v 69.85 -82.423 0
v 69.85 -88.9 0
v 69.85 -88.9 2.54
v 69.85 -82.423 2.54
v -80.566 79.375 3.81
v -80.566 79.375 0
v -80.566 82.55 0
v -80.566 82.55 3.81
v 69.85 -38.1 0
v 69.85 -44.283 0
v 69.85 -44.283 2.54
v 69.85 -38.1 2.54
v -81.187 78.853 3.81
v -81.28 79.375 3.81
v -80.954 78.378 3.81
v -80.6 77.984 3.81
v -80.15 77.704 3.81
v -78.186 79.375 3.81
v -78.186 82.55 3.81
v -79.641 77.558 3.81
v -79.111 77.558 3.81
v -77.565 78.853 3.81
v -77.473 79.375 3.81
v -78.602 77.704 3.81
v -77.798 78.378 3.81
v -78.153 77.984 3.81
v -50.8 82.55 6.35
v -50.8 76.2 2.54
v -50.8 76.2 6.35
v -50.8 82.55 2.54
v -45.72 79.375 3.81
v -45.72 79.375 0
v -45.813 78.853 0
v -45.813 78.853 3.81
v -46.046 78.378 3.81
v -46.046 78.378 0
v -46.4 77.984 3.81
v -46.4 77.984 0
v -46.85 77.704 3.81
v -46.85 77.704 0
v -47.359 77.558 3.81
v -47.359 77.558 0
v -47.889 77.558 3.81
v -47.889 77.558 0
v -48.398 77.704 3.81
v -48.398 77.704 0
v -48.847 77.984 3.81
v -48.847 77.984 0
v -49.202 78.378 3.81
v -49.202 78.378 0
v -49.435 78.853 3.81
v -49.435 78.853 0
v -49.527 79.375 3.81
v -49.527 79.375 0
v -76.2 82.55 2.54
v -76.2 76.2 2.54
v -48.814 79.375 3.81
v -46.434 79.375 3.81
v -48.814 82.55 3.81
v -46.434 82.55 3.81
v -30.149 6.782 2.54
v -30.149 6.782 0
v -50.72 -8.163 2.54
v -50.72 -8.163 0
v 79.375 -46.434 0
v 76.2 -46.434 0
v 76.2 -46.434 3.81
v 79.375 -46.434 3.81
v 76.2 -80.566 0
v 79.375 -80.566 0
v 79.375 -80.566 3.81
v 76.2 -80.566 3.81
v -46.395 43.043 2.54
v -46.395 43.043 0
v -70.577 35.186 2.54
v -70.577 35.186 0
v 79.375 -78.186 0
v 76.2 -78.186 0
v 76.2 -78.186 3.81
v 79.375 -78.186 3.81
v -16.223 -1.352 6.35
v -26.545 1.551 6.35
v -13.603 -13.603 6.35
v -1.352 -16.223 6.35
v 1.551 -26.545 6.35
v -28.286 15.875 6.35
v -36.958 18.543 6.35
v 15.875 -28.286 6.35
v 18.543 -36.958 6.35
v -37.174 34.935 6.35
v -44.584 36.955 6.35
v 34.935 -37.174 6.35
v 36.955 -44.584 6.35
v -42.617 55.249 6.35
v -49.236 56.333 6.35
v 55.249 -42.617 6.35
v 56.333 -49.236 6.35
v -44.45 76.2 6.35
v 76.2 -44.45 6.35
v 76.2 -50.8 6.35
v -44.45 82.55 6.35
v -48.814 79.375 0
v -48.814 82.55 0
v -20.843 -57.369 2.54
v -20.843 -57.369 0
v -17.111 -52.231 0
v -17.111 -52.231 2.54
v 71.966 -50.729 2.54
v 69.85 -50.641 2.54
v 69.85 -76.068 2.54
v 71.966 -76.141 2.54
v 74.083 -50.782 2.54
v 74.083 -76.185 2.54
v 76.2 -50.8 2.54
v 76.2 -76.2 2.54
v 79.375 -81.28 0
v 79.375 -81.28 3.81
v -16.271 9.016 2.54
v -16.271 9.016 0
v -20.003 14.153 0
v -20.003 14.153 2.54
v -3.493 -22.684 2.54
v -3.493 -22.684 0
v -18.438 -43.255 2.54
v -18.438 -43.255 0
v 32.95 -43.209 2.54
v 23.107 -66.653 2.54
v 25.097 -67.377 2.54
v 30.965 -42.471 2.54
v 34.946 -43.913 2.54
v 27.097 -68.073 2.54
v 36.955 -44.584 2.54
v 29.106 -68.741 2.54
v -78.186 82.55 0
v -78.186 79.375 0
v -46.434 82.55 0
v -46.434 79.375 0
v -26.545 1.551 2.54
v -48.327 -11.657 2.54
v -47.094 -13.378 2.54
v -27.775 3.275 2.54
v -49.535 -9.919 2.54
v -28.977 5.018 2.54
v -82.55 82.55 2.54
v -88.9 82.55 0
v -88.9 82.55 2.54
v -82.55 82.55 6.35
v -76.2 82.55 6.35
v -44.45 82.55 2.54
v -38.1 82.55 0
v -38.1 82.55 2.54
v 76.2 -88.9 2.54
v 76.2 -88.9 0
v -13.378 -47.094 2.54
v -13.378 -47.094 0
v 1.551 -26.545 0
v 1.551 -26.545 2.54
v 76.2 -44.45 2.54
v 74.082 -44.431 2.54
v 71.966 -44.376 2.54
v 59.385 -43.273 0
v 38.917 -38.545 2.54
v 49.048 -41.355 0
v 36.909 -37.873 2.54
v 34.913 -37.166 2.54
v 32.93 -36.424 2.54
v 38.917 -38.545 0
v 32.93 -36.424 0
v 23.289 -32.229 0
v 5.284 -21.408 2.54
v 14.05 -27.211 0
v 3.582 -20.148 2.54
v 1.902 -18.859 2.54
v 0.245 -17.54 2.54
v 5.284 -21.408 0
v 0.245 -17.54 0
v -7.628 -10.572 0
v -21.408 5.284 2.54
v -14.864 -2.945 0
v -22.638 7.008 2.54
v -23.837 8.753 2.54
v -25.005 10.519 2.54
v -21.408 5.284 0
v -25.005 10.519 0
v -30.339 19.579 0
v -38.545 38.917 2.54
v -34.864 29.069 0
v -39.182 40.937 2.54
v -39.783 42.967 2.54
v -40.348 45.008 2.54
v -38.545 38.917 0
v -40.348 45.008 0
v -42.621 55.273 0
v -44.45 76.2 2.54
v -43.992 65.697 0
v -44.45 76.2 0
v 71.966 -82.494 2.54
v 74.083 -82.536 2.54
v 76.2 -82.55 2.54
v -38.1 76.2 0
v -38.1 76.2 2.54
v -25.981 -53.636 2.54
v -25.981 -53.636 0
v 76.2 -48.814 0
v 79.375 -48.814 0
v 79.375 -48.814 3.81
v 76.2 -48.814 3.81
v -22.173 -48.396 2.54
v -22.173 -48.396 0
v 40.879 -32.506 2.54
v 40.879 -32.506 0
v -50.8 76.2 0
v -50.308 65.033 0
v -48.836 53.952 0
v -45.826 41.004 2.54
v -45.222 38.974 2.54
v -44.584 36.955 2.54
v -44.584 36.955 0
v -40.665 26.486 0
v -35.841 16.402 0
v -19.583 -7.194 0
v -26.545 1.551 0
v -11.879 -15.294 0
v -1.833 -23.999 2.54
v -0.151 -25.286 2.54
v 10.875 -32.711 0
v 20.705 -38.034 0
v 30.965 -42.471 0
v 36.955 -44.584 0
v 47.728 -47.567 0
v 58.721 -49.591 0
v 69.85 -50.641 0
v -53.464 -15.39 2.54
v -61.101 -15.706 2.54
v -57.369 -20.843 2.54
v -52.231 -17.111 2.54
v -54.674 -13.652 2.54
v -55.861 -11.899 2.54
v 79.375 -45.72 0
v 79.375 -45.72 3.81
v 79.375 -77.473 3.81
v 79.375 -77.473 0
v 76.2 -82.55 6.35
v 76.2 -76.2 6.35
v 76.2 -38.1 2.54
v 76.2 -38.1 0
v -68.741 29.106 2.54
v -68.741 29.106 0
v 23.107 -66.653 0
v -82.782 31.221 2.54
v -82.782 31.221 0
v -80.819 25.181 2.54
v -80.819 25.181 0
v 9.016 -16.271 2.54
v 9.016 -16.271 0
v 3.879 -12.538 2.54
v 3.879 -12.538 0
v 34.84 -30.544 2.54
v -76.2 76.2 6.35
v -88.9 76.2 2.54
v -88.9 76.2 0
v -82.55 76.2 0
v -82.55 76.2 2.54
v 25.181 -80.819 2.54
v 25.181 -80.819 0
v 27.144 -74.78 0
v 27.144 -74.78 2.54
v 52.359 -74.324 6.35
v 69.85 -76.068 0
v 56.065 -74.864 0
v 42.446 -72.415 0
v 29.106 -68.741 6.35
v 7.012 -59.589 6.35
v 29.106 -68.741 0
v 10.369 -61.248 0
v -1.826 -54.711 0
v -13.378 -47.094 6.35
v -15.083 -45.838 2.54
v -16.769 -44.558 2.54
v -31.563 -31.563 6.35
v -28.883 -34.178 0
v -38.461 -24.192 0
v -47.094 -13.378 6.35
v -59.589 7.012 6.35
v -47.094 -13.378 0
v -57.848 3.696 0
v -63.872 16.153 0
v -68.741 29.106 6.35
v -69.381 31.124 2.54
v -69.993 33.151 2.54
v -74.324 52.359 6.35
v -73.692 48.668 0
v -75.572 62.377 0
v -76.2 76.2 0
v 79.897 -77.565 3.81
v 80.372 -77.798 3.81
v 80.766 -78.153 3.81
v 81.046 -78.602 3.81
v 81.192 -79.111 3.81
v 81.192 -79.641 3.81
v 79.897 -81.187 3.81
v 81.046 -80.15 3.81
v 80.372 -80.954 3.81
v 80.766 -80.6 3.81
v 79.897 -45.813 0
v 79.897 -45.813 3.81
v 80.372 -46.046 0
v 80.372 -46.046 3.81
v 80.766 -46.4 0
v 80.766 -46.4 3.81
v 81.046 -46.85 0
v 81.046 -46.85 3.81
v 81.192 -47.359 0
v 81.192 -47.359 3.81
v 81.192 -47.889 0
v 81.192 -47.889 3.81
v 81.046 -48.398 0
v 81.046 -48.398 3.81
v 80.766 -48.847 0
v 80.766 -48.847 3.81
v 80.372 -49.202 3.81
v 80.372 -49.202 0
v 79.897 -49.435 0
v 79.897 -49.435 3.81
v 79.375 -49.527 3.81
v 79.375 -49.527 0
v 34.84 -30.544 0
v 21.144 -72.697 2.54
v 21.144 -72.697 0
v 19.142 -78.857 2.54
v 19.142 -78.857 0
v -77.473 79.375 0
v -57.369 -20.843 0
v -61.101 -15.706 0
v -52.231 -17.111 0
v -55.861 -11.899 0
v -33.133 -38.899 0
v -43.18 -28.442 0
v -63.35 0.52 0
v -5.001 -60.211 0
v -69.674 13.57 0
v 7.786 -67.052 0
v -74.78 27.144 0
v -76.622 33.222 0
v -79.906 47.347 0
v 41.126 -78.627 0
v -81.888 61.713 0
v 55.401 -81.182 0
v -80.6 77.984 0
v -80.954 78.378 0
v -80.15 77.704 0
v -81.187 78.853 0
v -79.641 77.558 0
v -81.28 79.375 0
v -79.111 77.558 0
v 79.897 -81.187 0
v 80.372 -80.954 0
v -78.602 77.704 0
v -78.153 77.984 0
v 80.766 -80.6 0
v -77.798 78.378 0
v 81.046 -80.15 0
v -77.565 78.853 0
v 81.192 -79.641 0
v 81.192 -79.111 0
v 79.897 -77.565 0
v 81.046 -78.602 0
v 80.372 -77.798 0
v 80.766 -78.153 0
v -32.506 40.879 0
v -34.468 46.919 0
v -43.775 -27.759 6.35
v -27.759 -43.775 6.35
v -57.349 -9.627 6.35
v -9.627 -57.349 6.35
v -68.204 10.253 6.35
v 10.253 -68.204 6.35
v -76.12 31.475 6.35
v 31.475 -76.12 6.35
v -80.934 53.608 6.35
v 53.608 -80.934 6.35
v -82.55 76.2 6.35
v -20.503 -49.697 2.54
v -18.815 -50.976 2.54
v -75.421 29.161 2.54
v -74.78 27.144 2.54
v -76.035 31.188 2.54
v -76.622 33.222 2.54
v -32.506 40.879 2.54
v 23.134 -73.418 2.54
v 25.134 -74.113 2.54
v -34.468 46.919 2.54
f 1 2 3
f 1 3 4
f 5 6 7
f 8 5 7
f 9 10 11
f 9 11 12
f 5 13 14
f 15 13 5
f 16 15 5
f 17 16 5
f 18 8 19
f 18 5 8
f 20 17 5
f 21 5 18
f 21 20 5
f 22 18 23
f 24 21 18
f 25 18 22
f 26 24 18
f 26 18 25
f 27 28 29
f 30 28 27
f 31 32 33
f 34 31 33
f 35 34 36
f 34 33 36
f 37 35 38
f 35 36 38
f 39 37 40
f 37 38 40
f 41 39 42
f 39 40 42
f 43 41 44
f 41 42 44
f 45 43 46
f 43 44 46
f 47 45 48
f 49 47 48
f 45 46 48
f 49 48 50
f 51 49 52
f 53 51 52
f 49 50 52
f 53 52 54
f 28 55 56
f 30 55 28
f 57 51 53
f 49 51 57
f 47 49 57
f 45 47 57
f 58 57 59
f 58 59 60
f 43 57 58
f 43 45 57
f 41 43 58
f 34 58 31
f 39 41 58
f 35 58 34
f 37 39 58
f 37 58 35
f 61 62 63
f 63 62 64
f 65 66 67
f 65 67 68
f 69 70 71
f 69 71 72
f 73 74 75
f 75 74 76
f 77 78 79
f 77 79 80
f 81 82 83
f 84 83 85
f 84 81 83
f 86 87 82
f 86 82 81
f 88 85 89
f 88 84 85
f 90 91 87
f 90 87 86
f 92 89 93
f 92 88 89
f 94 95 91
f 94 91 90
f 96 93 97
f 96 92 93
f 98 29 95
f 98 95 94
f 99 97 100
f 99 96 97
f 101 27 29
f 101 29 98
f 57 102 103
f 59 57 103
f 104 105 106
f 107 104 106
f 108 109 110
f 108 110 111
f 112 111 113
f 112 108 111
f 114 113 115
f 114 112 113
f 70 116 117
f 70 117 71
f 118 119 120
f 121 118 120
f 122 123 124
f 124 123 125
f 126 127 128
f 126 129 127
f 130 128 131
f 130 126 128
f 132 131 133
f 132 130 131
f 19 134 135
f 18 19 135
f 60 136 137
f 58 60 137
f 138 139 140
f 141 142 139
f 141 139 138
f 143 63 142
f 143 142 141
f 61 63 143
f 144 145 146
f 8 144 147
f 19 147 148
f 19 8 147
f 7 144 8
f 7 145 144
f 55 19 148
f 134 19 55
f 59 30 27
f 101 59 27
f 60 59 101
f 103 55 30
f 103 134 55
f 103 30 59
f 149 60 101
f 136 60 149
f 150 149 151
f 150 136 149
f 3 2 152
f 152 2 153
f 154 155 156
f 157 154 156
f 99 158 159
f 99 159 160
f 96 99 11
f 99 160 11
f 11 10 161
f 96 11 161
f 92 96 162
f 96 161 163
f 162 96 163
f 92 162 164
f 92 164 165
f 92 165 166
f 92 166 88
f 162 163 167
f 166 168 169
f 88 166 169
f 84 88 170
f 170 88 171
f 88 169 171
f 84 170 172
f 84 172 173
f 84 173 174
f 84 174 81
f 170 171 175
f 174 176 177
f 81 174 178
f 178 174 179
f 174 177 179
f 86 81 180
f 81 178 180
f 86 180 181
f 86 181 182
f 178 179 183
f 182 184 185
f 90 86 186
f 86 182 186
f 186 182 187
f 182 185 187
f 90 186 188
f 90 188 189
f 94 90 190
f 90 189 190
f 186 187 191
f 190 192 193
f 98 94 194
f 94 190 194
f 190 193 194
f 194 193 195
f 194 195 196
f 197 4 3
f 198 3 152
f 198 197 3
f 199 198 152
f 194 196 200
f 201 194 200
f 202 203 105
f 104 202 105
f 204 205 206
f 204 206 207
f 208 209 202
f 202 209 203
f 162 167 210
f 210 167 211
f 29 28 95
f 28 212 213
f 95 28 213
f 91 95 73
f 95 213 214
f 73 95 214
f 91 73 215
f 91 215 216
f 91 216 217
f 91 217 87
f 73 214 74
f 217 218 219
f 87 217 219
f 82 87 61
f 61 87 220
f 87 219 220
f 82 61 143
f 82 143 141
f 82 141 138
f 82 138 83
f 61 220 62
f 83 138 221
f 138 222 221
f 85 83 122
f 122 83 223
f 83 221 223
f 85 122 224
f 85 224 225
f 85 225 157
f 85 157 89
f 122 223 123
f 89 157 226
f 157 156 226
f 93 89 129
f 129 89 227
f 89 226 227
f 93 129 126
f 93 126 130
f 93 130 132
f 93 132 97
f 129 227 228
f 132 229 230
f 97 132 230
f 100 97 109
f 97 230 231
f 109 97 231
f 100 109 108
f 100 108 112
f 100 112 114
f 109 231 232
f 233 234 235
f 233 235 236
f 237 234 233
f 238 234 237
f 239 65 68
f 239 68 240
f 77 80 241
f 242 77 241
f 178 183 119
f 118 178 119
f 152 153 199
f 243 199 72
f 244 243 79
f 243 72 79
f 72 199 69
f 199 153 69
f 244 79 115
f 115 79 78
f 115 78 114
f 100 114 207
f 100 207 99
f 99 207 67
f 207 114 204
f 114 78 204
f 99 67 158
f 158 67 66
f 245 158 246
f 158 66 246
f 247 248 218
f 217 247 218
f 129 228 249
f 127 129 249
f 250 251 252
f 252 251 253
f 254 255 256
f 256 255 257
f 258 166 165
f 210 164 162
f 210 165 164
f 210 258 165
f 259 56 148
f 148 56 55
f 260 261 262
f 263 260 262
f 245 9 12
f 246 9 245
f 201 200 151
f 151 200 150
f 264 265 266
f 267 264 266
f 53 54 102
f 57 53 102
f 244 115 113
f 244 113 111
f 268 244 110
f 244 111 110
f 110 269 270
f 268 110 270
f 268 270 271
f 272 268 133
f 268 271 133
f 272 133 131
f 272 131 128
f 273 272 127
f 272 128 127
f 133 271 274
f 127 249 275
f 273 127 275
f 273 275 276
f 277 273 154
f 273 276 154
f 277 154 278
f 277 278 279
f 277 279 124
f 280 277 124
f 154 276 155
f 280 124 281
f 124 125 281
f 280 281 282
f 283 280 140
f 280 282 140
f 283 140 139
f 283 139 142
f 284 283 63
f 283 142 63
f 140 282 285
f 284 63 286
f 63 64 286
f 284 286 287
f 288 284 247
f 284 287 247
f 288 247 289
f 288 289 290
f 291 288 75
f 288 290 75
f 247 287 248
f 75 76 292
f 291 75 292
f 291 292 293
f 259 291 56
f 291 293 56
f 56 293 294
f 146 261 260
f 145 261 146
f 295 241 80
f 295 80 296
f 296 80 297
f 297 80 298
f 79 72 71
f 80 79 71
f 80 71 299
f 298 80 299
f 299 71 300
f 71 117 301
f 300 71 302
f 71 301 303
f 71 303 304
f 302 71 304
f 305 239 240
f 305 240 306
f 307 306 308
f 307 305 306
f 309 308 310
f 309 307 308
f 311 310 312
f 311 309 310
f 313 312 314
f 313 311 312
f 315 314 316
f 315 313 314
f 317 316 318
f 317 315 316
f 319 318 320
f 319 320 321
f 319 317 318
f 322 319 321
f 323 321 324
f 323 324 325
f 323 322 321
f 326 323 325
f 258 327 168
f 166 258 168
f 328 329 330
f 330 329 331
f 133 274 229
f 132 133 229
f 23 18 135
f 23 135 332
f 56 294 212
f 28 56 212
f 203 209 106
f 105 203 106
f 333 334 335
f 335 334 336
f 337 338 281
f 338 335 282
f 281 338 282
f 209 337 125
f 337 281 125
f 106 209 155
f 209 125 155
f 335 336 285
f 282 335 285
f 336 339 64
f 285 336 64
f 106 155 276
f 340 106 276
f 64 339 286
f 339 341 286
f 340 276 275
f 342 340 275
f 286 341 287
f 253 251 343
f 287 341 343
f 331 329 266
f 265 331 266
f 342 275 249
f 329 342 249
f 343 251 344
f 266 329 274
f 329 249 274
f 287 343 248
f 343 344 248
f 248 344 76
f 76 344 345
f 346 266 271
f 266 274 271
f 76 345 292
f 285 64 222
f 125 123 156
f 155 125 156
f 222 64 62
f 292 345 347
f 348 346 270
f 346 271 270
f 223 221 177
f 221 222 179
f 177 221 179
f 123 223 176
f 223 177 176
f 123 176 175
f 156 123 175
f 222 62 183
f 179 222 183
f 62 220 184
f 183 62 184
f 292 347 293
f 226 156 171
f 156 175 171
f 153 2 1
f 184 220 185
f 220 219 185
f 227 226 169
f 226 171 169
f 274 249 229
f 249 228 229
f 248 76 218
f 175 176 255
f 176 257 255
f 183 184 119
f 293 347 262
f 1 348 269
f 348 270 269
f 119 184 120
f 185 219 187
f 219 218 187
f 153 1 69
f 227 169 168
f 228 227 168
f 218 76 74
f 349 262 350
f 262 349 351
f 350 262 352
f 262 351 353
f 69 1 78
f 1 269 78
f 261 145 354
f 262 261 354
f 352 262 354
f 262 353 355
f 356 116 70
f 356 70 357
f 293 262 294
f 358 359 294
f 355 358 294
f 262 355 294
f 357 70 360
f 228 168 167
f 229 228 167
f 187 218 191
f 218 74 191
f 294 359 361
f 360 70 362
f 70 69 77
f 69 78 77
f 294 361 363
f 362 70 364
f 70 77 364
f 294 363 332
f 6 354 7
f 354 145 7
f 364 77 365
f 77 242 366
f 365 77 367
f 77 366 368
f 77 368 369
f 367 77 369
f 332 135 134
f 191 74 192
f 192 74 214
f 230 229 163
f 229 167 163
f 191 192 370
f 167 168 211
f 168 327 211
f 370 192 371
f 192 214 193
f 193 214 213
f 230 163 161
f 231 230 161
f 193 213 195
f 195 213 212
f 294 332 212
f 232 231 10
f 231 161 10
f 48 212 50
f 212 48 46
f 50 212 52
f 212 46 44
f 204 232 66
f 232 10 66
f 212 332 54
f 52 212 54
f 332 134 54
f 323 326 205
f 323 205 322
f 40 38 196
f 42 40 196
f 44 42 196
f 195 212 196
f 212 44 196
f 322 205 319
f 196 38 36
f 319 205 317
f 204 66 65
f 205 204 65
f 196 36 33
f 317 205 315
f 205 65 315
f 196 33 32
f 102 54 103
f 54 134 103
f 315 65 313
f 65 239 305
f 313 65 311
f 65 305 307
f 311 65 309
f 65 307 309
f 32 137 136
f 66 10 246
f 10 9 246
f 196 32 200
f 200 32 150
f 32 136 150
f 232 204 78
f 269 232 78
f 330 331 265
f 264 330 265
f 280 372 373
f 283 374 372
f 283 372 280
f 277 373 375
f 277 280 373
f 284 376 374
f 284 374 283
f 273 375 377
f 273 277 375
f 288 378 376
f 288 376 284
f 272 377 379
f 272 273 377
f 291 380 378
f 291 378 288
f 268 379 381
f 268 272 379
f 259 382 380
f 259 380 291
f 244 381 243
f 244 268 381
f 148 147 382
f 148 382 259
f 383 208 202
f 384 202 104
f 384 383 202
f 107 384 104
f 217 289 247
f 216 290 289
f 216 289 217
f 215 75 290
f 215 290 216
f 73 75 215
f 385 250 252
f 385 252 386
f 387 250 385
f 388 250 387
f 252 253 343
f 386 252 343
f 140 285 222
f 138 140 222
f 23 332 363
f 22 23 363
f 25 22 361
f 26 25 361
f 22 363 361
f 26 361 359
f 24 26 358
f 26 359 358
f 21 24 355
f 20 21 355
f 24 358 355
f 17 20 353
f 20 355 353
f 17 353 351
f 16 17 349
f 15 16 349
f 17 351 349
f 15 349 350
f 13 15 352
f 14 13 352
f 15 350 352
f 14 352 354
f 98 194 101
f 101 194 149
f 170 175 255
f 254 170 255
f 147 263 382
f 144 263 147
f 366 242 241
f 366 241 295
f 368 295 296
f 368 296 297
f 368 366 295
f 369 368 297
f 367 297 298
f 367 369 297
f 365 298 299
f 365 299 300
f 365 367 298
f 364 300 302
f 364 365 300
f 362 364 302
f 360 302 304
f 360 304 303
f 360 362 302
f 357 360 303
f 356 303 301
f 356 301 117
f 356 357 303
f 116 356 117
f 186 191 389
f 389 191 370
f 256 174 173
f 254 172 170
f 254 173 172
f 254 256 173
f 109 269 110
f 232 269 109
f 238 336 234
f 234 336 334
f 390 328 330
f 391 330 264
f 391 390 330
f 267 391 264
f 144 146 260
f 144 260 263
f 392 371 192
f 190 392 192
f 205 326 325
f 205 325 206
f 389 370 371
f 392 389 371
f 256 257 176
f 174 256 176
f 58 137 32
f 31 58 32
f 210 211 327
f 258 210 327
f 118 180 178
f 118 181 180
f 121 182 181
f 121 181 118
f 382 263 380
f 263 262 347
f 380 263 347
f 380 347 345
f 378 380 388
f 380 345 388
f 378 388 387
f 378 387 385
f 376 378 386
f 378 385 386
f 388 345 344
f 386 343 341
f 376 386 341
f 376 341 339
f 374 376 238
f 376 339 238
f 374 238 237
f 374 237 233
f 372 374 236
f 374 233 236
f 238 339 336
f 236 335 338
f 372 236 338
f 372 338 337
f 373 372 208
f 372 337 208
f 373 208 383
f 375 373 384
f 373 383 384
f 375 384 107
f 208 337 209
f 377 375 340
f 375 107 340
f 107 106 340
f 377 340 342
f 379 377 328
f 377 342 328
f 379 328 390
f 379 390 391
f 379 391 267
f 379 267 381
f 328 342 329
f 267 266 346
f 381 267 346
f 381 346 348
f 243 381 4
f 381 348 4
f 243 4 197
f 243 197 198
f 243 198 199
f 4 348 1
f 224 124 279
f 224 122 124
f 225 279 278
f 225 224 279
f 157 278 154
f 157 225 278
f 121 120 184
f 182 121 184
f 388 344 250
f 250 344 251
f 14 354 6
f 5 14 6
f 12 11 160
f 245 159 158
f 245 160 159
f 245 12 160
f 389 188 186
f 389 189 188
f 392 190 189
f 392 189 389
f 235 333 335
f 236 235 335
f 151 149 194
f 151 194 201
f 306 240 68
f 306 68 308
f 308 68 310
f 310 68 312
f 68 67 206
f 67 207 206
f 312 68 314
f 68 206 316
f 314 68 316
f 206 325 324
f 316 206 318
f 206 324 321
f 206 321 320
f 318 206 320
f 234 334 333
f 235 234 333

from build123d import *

# Parameters (mm, degrees)
F1_DEPTH = 6.35
F2_W     = 6.35
F2_H     = 50.8
F2_W_2   = 50.8
F2_H_2   = 6.35
F3_DEPTH = 2.54
F4_W     = 6.35
F4_H     = 6.35
F5_DEPTH = 6.35
F7_DEPTH = 3.81
F9_DEPTH = 3.81


with BuildPart() as f1:
    # F0 (on Top) → F1 (new body)
    with BuildSketch(Plane.XY):
        with BuildLine():
            Line((76.2, -82.55), (76.2, -76.2))
            ThreePointArc((76.2, -76.2), (-31.563073, -31.563073), (-76.2, 76.2))
            Line((-76.2, 76.2), (-82.55, 76.2))
            ThreePointArc((-82.55, 76.2), (-36.053202, -36.053202), (76.2, -82.55))
        make_face()
        with BuildLine():
            ThreePointArc((-50.8, 76.2), (-13.602561, -13.602561), (76.2, -50.8))
            Line((76.2, -50.8), (76.2, -44.45))
            ThreePointArc((76.2, -44.45), (-9.112433, -9.112433), (-44.45, 76.2))
            Line((-44.45, 76.2), (-50.8, 76.2))
        make_face()
    extrude(amount=F1_DEPTH)

    # F2 (on Top) → F3 (join)
    with BuildSketch(Plane.XY):
        with Locations((73.025, -63.5)):
            Rectangle(F2_W, F2_H)
        Polygon((25.181294, -80.819431), (40.879358, -32.50576), (34.840149, -30.543502), (19.142085, -78.857173), align=None)
        Polygon((-20.843345, -57.368706), (9.016146, -16.270642), (3.878888, -12.538206), (-25.980603, -53.636269), align=None)
        Polygon((-57.368706, -20.843345), (-16.270642, 9.016146), (-20.003079, 14.153404), (-61.101142, -15.706087), align=None)
        Polygon((-80.819431, 25.181294), (-32.50576, 40.879358), (-34.468018, 46.918566), (-82.781689, 31.220503), align=None)
        with Locations((-63.5, 79.375)):
            Rectangle(F2_W_2, F2_H_2)
    extrude(amount=F3_DEPTH)

    # F4 (on Top) → F5 (join)
    with BuildSketch(Plane.XY):
        with Locations((-79.375, 79.375)):
            Rectangle(F4_W, F4_H)
        with Locations((-47.625, 79.375)):
            Rectangle(F4_W, F4_H)
    extrude(amount=F5_DEPTH)

    # F6 (on face) → F7 (join)
    with BuildSketch(Plane(origin=(0, 0, 0), x_dir=(1, 0, 0), z_dir=(0, 0, -1))):
        with BuildLine():
            Line((76.2, 80.56626), (76.2, 79.37627))
            Line((76.2, 79.37627), (76.2, 78.18628))
            Line((76.2, 78.18628), (79.375, 78.18628))
            Line((79.375, 78.18628), (79.375, 77.47254))
            ThreePointArc((79.375, 77.47254), (81.210451, 79.37627), (79.375, 81.28))
            Line((79.375, 81.28), (79.375, 80.56626))
            Line((79.375, 80.56626), (76.2, 80.56626))
        make_face()
        with BuildLine():
            Line((76.2, 47.62373), (76.2, 46.43374))
            Line((76.2, 46.43374), (79.375, 46.43374))
            Line((79.375, 46.43374), (79.375, 45.72))
            ThreePointArc((79.375, 45.72), (81.210451, 47.62373), (79.375, 49.52746))
            Line((79.375, 49.52746), (79.375, 48.81372))
            Line((79.375, 48.81372), (76.2, 48.81372))
            Line((76.2, 48.81372), (76.2, 47.62373))
        make_face()
    extrude(amount=-F7_DEPTH)

    # F8 (on face) → F9 (cut)
    with BuildSketch(Plane(origin=(0, 0, 0), x_dir=(1, 0, 0), z_dir=(0, 0, -1))):
        with BuildLine():
            Line((-80.56626, -82.55), (-79.37627, -82.55))
            Line((-79.37627, -82.55), (-78.18628, -82.55))
            Line((-78.18628, -82.55), (-78.18628, -79.375))
            Line((-78.18628, -79.375), (-77.47254, -79.375))
            ThreePointArc((-77.47254, -79.375), (-79.37627, -77.539549), (-81.28, -79.375))
            Line((-81.28, -79.375), (-80.56626, -79.375))
            Line((-80.56626, -79.375), (-80.56626, -82.55))
        make_face()
        with BuildLine():
            Line((-49.52746, -79.375), (-48.81372, -79.375))
            Line((-48.81372, -79.375), (-48.81372, -82.55))
            Line((-48.81372, -82.55), (-47.62373, -82.55))
            Line((-47.62373, -82.55), (-46.43374, -82.55))
            Line((-46.43374, -82.55), (-46.43374, -79.375))
            Line((-46.43374, -79.375), (-45.72, -79.375))
            ThreePointArc((-45.72, -79.375), (-47.62373, -77.539549), (-49.52746, -79.375))
        make_face()
    extrude(amount=-F9_DEPTH, mode=Mode.SUBTRACT)


solid = f1.part
